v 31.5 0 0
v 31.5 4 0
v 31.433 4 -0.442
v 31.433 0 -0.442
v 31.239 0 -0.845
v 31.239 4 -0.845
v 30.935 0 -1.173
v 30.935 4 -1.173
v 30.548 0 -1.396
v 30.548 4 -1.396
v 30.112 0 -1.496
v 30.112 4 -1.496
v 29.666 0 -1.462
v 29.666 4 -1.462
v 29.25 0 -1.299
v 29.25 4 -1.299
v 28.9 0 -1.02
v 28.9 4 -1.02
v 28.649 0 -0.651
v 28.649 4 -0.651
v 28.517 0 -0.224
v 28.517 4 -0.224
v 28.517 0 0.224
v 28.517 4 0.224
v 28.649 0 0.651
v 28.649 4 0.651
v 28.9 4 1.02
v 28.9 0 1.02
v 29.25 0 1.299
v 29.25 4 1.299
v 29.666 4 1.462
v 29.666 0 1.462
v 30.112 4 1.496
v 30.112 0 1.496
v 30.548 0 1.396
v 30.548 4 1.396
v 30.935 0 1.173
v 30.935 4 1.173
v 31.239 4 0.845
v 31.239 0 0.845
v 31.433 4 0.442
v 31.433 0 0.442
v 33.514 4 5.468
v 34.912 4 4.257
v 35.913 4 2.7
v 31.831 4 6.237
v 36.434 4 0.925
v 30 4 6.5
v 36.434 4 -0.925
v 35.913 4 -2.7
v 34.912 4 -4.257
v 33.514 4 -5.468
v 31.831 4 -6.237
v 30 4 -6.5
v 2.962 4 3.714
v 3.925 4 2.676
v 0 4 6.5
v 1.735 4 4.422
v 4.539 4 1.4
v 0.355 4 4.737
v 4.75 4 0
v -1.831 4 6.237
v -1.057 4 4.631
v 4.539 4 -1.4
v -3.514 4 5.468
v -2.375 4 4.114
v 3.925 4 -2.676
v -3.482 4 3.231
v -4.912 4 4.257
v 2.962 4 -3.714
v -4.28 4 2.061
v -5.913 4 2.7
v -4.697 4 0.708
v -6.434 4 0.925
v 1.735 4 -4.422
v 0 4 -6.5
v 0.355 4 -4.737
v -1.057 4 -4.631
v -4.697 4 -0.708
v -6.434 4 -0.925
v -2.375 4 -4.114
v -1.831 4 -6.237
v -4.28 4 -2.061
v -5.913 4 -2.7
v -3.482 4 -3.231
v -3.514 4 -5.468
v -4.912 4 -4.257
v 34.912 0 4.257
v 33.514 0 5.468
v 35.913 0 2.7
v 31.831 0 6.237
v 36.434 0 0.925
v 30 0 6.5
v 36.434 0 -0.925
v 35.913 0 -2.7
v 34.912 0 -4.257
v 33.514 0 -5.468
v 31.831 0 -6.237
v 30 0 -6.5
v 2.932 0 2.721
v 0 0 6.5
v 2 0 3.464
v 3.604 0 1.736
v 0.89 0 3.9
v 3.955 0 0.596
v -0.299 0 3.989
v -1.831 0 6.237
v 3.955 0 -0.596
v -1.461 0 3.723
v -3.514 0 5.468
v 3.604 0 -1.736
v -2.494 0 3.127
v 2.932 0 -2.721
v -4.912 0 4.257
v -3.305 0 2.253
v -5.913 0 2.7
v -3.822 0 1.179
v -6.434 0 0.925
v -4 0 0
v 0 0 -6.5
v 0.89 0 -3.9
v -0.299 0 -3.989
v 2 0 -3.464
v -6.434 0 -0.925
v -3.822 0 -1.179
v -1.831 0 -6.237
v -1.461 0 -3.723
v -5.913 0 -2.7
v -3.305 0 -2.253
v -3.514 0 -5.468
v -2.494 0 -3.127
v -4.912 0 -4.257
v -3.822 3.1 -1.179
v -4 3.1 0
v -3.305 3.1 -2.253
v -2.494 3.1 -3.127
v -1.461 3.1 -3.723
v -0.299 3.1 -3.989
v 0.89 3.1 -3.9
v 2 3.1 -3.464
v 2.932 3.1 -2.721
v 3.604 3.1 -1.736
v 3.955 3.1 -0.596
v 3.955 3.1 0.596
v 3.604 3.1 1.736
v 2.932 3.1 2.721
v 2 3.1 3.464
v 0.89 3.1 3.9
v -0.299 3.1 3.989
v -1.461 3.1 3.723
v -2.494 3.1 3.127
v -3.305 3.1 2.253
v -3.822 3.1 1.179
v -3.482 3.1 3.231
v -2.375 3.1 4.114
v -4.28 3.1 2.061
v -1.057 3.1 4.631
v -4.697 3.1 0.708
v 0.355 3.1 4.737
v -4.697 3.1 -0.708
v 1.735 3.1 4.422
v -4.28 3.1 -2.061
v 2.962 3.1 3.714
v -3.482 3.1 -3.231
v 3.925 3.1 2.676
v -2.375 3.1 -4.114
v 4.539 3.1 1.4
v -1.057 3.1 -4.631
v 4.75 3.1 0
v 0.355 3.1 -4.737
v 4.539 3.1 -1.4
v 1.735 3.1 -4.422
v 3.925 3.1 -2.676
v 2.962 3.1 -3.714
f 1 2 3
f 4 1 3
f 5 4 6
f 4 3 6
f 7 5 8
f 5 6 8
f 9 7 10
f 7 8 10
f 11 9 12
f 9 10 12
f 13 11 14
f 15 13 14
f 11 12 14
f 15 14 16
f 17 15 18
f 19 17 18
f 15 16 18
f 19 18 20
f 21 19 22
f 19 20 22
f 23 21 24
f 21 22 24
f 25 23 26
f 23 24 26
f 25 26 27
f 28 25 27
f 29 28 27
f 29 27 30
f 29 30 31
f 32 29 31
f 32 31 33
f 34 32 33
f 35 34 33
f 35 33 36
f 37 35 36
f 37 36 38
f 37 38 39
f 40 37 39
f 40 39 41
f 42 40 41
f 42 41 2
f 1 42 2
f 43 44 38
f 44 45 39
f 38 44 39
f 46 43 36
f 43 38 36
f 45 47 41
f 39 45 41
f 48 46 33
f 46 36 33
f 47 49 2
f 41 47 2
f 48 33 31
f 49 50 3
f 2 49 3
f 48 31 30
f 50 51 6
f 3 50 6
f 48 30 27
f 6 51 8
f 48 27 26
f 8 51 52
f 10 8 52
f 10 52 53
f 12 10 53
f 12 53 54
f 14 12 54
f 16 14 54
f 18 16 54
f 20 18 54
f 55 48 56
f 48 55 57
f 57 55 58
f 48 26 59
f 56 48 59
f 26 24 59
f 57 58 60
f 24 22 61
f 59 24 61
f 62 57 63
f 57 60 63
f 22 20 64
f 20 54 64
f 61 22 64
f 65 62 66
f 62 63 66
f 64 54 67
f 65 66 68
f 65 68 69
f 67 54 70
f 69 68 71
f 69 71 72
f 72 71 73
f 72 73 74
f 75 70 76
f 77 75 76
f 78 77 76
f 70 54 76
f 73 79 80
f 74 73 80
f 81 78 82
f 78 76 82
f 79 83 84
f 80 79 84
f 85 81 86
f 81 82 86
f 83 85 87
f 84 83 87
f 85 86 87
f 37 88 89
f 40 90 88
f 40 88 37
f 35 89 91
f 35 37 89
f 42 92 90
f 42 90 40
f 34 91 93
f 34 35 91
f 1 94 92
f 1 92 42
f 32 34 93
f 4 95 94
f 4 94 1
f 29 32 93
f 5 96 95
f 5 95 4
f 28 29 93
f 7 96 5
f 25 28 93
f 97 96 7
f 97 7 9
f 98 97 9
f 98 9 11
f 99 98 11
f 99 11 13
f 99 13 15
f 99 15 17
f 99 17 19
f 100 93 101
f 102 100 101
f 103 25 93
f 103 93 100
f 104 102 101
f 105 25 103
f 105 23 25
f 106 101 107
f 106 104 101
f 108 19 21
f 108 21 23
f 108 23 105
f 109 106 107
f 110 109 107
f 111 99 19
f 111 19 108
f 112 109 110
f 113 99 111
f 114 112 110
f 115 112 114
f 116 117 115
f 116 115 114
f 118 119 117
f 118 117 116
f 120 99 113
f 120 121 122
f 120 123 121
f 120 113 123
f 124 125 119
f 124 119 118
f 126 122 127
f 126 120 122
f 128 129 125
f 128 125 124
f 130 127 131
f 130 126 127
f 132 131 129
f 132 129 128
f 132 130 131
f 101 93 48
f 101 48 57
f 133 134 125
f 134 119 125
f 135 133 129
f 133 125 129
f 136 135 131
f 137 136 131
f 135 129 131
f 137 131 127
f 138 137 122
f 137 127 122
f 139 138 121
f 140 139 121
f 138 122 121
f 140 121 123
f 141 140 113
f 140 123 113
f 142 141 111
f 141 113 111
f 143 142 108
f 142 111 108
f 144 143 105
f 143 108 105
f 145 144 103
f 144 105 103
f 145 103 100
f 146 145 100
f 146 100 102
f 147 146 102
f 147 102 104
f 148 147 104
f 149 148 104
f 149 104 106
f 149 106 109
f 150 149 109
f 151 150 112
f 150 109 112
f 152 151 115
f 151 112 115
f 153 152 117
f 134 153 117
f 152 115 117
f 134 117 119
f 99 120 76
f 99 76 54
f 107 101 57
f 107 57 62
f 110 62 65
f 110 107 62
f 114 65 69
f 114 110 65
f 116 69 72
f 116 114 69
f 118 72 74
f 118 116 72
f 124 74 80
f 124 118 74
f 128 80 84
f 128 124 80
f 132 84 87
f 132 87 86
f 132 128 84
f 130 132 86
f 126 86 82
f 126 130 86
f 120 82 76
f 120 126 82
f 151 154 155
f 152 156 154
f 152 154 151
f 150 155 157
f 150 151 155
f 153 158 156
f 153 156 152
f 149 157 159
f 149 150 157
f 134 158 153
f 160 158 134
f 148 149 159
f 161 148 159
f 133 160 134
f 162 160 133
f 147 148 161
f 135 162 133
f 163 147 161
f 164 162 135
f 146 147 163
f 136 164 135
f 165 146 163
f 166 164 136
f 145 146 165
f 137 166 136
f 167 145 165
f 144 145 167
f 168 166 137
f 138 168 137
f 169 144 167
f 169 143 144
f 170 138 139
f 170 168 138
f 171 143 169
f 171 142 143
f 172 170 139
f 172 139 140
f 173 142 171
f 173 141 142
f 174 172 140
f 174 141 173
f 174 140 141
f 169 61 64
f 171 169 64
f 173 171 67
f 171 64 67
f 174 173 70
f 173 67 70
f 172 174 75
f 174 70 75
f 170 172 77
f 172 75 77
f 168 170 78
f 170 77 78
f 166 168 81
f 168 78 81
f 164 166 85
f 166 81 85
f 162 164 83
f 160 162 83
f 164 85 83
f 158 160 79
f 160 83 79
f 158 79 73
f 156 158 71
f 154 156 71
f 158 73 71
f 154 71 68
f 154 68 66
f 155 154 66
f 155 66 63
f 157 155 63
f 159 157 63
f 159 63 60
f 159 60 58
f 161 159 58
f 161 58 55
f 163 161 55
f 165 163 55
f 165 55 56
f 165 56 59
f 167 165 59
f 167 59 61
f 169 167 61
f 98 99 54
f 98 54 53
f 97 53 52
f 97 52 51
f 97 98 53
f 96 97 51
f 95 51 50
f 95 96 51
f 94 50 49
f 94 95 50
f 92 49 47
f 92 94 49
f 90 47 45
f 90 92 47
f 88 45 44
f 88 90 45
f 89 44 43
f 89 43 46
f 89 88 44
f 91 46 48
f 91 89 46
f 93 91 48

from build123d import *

# Parameters (mm, degrees)
EXTRUDE_1_DEPTH              = 4
HOLE_WIZARD_M5_1_D           = 8
HOLE_WIZARD_M5_1_DEPTH       = 12.4
HOLE_WIZARD_M5_1_CBORE_D     = 9.5
HOLE_WIZARD_M5_1_CBORE_DEPTH = 0.9
HOLE_WIZARD_M5_1_TIP         = 2.403442476
SKETCH_4_R                   = 1.5
CUT_EXTRUDE_1_DEPTH          = 1
CUT_EXTRUDE_1_DEPTH_BACK     = 5


with BuildPart() as part:
    # 草图1 → 凸台-拉伸1 (new body)
    with BuildSketch(Plane(origin=(0, 0, 0), x_dir=(1, 0, 0), z_dir=(0, 1, 0))):
        with BuildLine():
            Line((0, 6.5), (30, 6.5))
            ThreePointArc((30, 6.5), (36.5, 0), (30, -6.5))
            Line((30, -6.5), (0, -6.5))
            ThreePointArc((0, -6.5), (-6.5, 0), (0, 6.5))
        make_face()
    extrude(amount=EXTRUDE_1_DEPTH)

    # M5 六角头螺栓的柱形沉头孔1
    with Locations(Plane(origin=(0, 4, 0), x_dir=(1, 0, 0), z_dir=(0, 1, 0))):
        with Locations((0, 0)):
            CounterBoreHole(HOLE_WIZARD_M5_1_D / 2, HOLE_WIZARD_M5_1_CBORE_D / 2, HOLE_WIZARD_M5_1_CBORE_DEPTH, depth=HOLE_WIZARD_M5_1_DEPTH)
            with Locations((0, 0, -(HOLE_WIZARD_M5_1_DEPTH + HOLE_WIZARD_M5_1_TIP / 2))):  # 118° drill point
                Cone(0, HOLE_WIZARD_M5_1_D / 2, HOLE_WIZARD_M5_1_TIP, mode=Mode.SUBTRACT)

    # 草图4 → 切除-拉伸1 (cut, two sides)
    with BuildSketch(Plane(origin=(0, 4, 0), x_dir=(1, 0, 0), z_dir=(0, 1, 0))) as cut_extrude_1_sk:
        with Locations((30, 0)):
            Circle(SKETCH_4_R)
    extrude(amount=CUT_EXTRUDE_1_DEPTH, mode=Mode.SUBTRACT)
    extrude(cut_extrude_1_sk.sketch, amount=-CUT_EXTRUDE_1_DEPTH_BACK, mode=Mode.SUBTRACT)


solid = part.part
